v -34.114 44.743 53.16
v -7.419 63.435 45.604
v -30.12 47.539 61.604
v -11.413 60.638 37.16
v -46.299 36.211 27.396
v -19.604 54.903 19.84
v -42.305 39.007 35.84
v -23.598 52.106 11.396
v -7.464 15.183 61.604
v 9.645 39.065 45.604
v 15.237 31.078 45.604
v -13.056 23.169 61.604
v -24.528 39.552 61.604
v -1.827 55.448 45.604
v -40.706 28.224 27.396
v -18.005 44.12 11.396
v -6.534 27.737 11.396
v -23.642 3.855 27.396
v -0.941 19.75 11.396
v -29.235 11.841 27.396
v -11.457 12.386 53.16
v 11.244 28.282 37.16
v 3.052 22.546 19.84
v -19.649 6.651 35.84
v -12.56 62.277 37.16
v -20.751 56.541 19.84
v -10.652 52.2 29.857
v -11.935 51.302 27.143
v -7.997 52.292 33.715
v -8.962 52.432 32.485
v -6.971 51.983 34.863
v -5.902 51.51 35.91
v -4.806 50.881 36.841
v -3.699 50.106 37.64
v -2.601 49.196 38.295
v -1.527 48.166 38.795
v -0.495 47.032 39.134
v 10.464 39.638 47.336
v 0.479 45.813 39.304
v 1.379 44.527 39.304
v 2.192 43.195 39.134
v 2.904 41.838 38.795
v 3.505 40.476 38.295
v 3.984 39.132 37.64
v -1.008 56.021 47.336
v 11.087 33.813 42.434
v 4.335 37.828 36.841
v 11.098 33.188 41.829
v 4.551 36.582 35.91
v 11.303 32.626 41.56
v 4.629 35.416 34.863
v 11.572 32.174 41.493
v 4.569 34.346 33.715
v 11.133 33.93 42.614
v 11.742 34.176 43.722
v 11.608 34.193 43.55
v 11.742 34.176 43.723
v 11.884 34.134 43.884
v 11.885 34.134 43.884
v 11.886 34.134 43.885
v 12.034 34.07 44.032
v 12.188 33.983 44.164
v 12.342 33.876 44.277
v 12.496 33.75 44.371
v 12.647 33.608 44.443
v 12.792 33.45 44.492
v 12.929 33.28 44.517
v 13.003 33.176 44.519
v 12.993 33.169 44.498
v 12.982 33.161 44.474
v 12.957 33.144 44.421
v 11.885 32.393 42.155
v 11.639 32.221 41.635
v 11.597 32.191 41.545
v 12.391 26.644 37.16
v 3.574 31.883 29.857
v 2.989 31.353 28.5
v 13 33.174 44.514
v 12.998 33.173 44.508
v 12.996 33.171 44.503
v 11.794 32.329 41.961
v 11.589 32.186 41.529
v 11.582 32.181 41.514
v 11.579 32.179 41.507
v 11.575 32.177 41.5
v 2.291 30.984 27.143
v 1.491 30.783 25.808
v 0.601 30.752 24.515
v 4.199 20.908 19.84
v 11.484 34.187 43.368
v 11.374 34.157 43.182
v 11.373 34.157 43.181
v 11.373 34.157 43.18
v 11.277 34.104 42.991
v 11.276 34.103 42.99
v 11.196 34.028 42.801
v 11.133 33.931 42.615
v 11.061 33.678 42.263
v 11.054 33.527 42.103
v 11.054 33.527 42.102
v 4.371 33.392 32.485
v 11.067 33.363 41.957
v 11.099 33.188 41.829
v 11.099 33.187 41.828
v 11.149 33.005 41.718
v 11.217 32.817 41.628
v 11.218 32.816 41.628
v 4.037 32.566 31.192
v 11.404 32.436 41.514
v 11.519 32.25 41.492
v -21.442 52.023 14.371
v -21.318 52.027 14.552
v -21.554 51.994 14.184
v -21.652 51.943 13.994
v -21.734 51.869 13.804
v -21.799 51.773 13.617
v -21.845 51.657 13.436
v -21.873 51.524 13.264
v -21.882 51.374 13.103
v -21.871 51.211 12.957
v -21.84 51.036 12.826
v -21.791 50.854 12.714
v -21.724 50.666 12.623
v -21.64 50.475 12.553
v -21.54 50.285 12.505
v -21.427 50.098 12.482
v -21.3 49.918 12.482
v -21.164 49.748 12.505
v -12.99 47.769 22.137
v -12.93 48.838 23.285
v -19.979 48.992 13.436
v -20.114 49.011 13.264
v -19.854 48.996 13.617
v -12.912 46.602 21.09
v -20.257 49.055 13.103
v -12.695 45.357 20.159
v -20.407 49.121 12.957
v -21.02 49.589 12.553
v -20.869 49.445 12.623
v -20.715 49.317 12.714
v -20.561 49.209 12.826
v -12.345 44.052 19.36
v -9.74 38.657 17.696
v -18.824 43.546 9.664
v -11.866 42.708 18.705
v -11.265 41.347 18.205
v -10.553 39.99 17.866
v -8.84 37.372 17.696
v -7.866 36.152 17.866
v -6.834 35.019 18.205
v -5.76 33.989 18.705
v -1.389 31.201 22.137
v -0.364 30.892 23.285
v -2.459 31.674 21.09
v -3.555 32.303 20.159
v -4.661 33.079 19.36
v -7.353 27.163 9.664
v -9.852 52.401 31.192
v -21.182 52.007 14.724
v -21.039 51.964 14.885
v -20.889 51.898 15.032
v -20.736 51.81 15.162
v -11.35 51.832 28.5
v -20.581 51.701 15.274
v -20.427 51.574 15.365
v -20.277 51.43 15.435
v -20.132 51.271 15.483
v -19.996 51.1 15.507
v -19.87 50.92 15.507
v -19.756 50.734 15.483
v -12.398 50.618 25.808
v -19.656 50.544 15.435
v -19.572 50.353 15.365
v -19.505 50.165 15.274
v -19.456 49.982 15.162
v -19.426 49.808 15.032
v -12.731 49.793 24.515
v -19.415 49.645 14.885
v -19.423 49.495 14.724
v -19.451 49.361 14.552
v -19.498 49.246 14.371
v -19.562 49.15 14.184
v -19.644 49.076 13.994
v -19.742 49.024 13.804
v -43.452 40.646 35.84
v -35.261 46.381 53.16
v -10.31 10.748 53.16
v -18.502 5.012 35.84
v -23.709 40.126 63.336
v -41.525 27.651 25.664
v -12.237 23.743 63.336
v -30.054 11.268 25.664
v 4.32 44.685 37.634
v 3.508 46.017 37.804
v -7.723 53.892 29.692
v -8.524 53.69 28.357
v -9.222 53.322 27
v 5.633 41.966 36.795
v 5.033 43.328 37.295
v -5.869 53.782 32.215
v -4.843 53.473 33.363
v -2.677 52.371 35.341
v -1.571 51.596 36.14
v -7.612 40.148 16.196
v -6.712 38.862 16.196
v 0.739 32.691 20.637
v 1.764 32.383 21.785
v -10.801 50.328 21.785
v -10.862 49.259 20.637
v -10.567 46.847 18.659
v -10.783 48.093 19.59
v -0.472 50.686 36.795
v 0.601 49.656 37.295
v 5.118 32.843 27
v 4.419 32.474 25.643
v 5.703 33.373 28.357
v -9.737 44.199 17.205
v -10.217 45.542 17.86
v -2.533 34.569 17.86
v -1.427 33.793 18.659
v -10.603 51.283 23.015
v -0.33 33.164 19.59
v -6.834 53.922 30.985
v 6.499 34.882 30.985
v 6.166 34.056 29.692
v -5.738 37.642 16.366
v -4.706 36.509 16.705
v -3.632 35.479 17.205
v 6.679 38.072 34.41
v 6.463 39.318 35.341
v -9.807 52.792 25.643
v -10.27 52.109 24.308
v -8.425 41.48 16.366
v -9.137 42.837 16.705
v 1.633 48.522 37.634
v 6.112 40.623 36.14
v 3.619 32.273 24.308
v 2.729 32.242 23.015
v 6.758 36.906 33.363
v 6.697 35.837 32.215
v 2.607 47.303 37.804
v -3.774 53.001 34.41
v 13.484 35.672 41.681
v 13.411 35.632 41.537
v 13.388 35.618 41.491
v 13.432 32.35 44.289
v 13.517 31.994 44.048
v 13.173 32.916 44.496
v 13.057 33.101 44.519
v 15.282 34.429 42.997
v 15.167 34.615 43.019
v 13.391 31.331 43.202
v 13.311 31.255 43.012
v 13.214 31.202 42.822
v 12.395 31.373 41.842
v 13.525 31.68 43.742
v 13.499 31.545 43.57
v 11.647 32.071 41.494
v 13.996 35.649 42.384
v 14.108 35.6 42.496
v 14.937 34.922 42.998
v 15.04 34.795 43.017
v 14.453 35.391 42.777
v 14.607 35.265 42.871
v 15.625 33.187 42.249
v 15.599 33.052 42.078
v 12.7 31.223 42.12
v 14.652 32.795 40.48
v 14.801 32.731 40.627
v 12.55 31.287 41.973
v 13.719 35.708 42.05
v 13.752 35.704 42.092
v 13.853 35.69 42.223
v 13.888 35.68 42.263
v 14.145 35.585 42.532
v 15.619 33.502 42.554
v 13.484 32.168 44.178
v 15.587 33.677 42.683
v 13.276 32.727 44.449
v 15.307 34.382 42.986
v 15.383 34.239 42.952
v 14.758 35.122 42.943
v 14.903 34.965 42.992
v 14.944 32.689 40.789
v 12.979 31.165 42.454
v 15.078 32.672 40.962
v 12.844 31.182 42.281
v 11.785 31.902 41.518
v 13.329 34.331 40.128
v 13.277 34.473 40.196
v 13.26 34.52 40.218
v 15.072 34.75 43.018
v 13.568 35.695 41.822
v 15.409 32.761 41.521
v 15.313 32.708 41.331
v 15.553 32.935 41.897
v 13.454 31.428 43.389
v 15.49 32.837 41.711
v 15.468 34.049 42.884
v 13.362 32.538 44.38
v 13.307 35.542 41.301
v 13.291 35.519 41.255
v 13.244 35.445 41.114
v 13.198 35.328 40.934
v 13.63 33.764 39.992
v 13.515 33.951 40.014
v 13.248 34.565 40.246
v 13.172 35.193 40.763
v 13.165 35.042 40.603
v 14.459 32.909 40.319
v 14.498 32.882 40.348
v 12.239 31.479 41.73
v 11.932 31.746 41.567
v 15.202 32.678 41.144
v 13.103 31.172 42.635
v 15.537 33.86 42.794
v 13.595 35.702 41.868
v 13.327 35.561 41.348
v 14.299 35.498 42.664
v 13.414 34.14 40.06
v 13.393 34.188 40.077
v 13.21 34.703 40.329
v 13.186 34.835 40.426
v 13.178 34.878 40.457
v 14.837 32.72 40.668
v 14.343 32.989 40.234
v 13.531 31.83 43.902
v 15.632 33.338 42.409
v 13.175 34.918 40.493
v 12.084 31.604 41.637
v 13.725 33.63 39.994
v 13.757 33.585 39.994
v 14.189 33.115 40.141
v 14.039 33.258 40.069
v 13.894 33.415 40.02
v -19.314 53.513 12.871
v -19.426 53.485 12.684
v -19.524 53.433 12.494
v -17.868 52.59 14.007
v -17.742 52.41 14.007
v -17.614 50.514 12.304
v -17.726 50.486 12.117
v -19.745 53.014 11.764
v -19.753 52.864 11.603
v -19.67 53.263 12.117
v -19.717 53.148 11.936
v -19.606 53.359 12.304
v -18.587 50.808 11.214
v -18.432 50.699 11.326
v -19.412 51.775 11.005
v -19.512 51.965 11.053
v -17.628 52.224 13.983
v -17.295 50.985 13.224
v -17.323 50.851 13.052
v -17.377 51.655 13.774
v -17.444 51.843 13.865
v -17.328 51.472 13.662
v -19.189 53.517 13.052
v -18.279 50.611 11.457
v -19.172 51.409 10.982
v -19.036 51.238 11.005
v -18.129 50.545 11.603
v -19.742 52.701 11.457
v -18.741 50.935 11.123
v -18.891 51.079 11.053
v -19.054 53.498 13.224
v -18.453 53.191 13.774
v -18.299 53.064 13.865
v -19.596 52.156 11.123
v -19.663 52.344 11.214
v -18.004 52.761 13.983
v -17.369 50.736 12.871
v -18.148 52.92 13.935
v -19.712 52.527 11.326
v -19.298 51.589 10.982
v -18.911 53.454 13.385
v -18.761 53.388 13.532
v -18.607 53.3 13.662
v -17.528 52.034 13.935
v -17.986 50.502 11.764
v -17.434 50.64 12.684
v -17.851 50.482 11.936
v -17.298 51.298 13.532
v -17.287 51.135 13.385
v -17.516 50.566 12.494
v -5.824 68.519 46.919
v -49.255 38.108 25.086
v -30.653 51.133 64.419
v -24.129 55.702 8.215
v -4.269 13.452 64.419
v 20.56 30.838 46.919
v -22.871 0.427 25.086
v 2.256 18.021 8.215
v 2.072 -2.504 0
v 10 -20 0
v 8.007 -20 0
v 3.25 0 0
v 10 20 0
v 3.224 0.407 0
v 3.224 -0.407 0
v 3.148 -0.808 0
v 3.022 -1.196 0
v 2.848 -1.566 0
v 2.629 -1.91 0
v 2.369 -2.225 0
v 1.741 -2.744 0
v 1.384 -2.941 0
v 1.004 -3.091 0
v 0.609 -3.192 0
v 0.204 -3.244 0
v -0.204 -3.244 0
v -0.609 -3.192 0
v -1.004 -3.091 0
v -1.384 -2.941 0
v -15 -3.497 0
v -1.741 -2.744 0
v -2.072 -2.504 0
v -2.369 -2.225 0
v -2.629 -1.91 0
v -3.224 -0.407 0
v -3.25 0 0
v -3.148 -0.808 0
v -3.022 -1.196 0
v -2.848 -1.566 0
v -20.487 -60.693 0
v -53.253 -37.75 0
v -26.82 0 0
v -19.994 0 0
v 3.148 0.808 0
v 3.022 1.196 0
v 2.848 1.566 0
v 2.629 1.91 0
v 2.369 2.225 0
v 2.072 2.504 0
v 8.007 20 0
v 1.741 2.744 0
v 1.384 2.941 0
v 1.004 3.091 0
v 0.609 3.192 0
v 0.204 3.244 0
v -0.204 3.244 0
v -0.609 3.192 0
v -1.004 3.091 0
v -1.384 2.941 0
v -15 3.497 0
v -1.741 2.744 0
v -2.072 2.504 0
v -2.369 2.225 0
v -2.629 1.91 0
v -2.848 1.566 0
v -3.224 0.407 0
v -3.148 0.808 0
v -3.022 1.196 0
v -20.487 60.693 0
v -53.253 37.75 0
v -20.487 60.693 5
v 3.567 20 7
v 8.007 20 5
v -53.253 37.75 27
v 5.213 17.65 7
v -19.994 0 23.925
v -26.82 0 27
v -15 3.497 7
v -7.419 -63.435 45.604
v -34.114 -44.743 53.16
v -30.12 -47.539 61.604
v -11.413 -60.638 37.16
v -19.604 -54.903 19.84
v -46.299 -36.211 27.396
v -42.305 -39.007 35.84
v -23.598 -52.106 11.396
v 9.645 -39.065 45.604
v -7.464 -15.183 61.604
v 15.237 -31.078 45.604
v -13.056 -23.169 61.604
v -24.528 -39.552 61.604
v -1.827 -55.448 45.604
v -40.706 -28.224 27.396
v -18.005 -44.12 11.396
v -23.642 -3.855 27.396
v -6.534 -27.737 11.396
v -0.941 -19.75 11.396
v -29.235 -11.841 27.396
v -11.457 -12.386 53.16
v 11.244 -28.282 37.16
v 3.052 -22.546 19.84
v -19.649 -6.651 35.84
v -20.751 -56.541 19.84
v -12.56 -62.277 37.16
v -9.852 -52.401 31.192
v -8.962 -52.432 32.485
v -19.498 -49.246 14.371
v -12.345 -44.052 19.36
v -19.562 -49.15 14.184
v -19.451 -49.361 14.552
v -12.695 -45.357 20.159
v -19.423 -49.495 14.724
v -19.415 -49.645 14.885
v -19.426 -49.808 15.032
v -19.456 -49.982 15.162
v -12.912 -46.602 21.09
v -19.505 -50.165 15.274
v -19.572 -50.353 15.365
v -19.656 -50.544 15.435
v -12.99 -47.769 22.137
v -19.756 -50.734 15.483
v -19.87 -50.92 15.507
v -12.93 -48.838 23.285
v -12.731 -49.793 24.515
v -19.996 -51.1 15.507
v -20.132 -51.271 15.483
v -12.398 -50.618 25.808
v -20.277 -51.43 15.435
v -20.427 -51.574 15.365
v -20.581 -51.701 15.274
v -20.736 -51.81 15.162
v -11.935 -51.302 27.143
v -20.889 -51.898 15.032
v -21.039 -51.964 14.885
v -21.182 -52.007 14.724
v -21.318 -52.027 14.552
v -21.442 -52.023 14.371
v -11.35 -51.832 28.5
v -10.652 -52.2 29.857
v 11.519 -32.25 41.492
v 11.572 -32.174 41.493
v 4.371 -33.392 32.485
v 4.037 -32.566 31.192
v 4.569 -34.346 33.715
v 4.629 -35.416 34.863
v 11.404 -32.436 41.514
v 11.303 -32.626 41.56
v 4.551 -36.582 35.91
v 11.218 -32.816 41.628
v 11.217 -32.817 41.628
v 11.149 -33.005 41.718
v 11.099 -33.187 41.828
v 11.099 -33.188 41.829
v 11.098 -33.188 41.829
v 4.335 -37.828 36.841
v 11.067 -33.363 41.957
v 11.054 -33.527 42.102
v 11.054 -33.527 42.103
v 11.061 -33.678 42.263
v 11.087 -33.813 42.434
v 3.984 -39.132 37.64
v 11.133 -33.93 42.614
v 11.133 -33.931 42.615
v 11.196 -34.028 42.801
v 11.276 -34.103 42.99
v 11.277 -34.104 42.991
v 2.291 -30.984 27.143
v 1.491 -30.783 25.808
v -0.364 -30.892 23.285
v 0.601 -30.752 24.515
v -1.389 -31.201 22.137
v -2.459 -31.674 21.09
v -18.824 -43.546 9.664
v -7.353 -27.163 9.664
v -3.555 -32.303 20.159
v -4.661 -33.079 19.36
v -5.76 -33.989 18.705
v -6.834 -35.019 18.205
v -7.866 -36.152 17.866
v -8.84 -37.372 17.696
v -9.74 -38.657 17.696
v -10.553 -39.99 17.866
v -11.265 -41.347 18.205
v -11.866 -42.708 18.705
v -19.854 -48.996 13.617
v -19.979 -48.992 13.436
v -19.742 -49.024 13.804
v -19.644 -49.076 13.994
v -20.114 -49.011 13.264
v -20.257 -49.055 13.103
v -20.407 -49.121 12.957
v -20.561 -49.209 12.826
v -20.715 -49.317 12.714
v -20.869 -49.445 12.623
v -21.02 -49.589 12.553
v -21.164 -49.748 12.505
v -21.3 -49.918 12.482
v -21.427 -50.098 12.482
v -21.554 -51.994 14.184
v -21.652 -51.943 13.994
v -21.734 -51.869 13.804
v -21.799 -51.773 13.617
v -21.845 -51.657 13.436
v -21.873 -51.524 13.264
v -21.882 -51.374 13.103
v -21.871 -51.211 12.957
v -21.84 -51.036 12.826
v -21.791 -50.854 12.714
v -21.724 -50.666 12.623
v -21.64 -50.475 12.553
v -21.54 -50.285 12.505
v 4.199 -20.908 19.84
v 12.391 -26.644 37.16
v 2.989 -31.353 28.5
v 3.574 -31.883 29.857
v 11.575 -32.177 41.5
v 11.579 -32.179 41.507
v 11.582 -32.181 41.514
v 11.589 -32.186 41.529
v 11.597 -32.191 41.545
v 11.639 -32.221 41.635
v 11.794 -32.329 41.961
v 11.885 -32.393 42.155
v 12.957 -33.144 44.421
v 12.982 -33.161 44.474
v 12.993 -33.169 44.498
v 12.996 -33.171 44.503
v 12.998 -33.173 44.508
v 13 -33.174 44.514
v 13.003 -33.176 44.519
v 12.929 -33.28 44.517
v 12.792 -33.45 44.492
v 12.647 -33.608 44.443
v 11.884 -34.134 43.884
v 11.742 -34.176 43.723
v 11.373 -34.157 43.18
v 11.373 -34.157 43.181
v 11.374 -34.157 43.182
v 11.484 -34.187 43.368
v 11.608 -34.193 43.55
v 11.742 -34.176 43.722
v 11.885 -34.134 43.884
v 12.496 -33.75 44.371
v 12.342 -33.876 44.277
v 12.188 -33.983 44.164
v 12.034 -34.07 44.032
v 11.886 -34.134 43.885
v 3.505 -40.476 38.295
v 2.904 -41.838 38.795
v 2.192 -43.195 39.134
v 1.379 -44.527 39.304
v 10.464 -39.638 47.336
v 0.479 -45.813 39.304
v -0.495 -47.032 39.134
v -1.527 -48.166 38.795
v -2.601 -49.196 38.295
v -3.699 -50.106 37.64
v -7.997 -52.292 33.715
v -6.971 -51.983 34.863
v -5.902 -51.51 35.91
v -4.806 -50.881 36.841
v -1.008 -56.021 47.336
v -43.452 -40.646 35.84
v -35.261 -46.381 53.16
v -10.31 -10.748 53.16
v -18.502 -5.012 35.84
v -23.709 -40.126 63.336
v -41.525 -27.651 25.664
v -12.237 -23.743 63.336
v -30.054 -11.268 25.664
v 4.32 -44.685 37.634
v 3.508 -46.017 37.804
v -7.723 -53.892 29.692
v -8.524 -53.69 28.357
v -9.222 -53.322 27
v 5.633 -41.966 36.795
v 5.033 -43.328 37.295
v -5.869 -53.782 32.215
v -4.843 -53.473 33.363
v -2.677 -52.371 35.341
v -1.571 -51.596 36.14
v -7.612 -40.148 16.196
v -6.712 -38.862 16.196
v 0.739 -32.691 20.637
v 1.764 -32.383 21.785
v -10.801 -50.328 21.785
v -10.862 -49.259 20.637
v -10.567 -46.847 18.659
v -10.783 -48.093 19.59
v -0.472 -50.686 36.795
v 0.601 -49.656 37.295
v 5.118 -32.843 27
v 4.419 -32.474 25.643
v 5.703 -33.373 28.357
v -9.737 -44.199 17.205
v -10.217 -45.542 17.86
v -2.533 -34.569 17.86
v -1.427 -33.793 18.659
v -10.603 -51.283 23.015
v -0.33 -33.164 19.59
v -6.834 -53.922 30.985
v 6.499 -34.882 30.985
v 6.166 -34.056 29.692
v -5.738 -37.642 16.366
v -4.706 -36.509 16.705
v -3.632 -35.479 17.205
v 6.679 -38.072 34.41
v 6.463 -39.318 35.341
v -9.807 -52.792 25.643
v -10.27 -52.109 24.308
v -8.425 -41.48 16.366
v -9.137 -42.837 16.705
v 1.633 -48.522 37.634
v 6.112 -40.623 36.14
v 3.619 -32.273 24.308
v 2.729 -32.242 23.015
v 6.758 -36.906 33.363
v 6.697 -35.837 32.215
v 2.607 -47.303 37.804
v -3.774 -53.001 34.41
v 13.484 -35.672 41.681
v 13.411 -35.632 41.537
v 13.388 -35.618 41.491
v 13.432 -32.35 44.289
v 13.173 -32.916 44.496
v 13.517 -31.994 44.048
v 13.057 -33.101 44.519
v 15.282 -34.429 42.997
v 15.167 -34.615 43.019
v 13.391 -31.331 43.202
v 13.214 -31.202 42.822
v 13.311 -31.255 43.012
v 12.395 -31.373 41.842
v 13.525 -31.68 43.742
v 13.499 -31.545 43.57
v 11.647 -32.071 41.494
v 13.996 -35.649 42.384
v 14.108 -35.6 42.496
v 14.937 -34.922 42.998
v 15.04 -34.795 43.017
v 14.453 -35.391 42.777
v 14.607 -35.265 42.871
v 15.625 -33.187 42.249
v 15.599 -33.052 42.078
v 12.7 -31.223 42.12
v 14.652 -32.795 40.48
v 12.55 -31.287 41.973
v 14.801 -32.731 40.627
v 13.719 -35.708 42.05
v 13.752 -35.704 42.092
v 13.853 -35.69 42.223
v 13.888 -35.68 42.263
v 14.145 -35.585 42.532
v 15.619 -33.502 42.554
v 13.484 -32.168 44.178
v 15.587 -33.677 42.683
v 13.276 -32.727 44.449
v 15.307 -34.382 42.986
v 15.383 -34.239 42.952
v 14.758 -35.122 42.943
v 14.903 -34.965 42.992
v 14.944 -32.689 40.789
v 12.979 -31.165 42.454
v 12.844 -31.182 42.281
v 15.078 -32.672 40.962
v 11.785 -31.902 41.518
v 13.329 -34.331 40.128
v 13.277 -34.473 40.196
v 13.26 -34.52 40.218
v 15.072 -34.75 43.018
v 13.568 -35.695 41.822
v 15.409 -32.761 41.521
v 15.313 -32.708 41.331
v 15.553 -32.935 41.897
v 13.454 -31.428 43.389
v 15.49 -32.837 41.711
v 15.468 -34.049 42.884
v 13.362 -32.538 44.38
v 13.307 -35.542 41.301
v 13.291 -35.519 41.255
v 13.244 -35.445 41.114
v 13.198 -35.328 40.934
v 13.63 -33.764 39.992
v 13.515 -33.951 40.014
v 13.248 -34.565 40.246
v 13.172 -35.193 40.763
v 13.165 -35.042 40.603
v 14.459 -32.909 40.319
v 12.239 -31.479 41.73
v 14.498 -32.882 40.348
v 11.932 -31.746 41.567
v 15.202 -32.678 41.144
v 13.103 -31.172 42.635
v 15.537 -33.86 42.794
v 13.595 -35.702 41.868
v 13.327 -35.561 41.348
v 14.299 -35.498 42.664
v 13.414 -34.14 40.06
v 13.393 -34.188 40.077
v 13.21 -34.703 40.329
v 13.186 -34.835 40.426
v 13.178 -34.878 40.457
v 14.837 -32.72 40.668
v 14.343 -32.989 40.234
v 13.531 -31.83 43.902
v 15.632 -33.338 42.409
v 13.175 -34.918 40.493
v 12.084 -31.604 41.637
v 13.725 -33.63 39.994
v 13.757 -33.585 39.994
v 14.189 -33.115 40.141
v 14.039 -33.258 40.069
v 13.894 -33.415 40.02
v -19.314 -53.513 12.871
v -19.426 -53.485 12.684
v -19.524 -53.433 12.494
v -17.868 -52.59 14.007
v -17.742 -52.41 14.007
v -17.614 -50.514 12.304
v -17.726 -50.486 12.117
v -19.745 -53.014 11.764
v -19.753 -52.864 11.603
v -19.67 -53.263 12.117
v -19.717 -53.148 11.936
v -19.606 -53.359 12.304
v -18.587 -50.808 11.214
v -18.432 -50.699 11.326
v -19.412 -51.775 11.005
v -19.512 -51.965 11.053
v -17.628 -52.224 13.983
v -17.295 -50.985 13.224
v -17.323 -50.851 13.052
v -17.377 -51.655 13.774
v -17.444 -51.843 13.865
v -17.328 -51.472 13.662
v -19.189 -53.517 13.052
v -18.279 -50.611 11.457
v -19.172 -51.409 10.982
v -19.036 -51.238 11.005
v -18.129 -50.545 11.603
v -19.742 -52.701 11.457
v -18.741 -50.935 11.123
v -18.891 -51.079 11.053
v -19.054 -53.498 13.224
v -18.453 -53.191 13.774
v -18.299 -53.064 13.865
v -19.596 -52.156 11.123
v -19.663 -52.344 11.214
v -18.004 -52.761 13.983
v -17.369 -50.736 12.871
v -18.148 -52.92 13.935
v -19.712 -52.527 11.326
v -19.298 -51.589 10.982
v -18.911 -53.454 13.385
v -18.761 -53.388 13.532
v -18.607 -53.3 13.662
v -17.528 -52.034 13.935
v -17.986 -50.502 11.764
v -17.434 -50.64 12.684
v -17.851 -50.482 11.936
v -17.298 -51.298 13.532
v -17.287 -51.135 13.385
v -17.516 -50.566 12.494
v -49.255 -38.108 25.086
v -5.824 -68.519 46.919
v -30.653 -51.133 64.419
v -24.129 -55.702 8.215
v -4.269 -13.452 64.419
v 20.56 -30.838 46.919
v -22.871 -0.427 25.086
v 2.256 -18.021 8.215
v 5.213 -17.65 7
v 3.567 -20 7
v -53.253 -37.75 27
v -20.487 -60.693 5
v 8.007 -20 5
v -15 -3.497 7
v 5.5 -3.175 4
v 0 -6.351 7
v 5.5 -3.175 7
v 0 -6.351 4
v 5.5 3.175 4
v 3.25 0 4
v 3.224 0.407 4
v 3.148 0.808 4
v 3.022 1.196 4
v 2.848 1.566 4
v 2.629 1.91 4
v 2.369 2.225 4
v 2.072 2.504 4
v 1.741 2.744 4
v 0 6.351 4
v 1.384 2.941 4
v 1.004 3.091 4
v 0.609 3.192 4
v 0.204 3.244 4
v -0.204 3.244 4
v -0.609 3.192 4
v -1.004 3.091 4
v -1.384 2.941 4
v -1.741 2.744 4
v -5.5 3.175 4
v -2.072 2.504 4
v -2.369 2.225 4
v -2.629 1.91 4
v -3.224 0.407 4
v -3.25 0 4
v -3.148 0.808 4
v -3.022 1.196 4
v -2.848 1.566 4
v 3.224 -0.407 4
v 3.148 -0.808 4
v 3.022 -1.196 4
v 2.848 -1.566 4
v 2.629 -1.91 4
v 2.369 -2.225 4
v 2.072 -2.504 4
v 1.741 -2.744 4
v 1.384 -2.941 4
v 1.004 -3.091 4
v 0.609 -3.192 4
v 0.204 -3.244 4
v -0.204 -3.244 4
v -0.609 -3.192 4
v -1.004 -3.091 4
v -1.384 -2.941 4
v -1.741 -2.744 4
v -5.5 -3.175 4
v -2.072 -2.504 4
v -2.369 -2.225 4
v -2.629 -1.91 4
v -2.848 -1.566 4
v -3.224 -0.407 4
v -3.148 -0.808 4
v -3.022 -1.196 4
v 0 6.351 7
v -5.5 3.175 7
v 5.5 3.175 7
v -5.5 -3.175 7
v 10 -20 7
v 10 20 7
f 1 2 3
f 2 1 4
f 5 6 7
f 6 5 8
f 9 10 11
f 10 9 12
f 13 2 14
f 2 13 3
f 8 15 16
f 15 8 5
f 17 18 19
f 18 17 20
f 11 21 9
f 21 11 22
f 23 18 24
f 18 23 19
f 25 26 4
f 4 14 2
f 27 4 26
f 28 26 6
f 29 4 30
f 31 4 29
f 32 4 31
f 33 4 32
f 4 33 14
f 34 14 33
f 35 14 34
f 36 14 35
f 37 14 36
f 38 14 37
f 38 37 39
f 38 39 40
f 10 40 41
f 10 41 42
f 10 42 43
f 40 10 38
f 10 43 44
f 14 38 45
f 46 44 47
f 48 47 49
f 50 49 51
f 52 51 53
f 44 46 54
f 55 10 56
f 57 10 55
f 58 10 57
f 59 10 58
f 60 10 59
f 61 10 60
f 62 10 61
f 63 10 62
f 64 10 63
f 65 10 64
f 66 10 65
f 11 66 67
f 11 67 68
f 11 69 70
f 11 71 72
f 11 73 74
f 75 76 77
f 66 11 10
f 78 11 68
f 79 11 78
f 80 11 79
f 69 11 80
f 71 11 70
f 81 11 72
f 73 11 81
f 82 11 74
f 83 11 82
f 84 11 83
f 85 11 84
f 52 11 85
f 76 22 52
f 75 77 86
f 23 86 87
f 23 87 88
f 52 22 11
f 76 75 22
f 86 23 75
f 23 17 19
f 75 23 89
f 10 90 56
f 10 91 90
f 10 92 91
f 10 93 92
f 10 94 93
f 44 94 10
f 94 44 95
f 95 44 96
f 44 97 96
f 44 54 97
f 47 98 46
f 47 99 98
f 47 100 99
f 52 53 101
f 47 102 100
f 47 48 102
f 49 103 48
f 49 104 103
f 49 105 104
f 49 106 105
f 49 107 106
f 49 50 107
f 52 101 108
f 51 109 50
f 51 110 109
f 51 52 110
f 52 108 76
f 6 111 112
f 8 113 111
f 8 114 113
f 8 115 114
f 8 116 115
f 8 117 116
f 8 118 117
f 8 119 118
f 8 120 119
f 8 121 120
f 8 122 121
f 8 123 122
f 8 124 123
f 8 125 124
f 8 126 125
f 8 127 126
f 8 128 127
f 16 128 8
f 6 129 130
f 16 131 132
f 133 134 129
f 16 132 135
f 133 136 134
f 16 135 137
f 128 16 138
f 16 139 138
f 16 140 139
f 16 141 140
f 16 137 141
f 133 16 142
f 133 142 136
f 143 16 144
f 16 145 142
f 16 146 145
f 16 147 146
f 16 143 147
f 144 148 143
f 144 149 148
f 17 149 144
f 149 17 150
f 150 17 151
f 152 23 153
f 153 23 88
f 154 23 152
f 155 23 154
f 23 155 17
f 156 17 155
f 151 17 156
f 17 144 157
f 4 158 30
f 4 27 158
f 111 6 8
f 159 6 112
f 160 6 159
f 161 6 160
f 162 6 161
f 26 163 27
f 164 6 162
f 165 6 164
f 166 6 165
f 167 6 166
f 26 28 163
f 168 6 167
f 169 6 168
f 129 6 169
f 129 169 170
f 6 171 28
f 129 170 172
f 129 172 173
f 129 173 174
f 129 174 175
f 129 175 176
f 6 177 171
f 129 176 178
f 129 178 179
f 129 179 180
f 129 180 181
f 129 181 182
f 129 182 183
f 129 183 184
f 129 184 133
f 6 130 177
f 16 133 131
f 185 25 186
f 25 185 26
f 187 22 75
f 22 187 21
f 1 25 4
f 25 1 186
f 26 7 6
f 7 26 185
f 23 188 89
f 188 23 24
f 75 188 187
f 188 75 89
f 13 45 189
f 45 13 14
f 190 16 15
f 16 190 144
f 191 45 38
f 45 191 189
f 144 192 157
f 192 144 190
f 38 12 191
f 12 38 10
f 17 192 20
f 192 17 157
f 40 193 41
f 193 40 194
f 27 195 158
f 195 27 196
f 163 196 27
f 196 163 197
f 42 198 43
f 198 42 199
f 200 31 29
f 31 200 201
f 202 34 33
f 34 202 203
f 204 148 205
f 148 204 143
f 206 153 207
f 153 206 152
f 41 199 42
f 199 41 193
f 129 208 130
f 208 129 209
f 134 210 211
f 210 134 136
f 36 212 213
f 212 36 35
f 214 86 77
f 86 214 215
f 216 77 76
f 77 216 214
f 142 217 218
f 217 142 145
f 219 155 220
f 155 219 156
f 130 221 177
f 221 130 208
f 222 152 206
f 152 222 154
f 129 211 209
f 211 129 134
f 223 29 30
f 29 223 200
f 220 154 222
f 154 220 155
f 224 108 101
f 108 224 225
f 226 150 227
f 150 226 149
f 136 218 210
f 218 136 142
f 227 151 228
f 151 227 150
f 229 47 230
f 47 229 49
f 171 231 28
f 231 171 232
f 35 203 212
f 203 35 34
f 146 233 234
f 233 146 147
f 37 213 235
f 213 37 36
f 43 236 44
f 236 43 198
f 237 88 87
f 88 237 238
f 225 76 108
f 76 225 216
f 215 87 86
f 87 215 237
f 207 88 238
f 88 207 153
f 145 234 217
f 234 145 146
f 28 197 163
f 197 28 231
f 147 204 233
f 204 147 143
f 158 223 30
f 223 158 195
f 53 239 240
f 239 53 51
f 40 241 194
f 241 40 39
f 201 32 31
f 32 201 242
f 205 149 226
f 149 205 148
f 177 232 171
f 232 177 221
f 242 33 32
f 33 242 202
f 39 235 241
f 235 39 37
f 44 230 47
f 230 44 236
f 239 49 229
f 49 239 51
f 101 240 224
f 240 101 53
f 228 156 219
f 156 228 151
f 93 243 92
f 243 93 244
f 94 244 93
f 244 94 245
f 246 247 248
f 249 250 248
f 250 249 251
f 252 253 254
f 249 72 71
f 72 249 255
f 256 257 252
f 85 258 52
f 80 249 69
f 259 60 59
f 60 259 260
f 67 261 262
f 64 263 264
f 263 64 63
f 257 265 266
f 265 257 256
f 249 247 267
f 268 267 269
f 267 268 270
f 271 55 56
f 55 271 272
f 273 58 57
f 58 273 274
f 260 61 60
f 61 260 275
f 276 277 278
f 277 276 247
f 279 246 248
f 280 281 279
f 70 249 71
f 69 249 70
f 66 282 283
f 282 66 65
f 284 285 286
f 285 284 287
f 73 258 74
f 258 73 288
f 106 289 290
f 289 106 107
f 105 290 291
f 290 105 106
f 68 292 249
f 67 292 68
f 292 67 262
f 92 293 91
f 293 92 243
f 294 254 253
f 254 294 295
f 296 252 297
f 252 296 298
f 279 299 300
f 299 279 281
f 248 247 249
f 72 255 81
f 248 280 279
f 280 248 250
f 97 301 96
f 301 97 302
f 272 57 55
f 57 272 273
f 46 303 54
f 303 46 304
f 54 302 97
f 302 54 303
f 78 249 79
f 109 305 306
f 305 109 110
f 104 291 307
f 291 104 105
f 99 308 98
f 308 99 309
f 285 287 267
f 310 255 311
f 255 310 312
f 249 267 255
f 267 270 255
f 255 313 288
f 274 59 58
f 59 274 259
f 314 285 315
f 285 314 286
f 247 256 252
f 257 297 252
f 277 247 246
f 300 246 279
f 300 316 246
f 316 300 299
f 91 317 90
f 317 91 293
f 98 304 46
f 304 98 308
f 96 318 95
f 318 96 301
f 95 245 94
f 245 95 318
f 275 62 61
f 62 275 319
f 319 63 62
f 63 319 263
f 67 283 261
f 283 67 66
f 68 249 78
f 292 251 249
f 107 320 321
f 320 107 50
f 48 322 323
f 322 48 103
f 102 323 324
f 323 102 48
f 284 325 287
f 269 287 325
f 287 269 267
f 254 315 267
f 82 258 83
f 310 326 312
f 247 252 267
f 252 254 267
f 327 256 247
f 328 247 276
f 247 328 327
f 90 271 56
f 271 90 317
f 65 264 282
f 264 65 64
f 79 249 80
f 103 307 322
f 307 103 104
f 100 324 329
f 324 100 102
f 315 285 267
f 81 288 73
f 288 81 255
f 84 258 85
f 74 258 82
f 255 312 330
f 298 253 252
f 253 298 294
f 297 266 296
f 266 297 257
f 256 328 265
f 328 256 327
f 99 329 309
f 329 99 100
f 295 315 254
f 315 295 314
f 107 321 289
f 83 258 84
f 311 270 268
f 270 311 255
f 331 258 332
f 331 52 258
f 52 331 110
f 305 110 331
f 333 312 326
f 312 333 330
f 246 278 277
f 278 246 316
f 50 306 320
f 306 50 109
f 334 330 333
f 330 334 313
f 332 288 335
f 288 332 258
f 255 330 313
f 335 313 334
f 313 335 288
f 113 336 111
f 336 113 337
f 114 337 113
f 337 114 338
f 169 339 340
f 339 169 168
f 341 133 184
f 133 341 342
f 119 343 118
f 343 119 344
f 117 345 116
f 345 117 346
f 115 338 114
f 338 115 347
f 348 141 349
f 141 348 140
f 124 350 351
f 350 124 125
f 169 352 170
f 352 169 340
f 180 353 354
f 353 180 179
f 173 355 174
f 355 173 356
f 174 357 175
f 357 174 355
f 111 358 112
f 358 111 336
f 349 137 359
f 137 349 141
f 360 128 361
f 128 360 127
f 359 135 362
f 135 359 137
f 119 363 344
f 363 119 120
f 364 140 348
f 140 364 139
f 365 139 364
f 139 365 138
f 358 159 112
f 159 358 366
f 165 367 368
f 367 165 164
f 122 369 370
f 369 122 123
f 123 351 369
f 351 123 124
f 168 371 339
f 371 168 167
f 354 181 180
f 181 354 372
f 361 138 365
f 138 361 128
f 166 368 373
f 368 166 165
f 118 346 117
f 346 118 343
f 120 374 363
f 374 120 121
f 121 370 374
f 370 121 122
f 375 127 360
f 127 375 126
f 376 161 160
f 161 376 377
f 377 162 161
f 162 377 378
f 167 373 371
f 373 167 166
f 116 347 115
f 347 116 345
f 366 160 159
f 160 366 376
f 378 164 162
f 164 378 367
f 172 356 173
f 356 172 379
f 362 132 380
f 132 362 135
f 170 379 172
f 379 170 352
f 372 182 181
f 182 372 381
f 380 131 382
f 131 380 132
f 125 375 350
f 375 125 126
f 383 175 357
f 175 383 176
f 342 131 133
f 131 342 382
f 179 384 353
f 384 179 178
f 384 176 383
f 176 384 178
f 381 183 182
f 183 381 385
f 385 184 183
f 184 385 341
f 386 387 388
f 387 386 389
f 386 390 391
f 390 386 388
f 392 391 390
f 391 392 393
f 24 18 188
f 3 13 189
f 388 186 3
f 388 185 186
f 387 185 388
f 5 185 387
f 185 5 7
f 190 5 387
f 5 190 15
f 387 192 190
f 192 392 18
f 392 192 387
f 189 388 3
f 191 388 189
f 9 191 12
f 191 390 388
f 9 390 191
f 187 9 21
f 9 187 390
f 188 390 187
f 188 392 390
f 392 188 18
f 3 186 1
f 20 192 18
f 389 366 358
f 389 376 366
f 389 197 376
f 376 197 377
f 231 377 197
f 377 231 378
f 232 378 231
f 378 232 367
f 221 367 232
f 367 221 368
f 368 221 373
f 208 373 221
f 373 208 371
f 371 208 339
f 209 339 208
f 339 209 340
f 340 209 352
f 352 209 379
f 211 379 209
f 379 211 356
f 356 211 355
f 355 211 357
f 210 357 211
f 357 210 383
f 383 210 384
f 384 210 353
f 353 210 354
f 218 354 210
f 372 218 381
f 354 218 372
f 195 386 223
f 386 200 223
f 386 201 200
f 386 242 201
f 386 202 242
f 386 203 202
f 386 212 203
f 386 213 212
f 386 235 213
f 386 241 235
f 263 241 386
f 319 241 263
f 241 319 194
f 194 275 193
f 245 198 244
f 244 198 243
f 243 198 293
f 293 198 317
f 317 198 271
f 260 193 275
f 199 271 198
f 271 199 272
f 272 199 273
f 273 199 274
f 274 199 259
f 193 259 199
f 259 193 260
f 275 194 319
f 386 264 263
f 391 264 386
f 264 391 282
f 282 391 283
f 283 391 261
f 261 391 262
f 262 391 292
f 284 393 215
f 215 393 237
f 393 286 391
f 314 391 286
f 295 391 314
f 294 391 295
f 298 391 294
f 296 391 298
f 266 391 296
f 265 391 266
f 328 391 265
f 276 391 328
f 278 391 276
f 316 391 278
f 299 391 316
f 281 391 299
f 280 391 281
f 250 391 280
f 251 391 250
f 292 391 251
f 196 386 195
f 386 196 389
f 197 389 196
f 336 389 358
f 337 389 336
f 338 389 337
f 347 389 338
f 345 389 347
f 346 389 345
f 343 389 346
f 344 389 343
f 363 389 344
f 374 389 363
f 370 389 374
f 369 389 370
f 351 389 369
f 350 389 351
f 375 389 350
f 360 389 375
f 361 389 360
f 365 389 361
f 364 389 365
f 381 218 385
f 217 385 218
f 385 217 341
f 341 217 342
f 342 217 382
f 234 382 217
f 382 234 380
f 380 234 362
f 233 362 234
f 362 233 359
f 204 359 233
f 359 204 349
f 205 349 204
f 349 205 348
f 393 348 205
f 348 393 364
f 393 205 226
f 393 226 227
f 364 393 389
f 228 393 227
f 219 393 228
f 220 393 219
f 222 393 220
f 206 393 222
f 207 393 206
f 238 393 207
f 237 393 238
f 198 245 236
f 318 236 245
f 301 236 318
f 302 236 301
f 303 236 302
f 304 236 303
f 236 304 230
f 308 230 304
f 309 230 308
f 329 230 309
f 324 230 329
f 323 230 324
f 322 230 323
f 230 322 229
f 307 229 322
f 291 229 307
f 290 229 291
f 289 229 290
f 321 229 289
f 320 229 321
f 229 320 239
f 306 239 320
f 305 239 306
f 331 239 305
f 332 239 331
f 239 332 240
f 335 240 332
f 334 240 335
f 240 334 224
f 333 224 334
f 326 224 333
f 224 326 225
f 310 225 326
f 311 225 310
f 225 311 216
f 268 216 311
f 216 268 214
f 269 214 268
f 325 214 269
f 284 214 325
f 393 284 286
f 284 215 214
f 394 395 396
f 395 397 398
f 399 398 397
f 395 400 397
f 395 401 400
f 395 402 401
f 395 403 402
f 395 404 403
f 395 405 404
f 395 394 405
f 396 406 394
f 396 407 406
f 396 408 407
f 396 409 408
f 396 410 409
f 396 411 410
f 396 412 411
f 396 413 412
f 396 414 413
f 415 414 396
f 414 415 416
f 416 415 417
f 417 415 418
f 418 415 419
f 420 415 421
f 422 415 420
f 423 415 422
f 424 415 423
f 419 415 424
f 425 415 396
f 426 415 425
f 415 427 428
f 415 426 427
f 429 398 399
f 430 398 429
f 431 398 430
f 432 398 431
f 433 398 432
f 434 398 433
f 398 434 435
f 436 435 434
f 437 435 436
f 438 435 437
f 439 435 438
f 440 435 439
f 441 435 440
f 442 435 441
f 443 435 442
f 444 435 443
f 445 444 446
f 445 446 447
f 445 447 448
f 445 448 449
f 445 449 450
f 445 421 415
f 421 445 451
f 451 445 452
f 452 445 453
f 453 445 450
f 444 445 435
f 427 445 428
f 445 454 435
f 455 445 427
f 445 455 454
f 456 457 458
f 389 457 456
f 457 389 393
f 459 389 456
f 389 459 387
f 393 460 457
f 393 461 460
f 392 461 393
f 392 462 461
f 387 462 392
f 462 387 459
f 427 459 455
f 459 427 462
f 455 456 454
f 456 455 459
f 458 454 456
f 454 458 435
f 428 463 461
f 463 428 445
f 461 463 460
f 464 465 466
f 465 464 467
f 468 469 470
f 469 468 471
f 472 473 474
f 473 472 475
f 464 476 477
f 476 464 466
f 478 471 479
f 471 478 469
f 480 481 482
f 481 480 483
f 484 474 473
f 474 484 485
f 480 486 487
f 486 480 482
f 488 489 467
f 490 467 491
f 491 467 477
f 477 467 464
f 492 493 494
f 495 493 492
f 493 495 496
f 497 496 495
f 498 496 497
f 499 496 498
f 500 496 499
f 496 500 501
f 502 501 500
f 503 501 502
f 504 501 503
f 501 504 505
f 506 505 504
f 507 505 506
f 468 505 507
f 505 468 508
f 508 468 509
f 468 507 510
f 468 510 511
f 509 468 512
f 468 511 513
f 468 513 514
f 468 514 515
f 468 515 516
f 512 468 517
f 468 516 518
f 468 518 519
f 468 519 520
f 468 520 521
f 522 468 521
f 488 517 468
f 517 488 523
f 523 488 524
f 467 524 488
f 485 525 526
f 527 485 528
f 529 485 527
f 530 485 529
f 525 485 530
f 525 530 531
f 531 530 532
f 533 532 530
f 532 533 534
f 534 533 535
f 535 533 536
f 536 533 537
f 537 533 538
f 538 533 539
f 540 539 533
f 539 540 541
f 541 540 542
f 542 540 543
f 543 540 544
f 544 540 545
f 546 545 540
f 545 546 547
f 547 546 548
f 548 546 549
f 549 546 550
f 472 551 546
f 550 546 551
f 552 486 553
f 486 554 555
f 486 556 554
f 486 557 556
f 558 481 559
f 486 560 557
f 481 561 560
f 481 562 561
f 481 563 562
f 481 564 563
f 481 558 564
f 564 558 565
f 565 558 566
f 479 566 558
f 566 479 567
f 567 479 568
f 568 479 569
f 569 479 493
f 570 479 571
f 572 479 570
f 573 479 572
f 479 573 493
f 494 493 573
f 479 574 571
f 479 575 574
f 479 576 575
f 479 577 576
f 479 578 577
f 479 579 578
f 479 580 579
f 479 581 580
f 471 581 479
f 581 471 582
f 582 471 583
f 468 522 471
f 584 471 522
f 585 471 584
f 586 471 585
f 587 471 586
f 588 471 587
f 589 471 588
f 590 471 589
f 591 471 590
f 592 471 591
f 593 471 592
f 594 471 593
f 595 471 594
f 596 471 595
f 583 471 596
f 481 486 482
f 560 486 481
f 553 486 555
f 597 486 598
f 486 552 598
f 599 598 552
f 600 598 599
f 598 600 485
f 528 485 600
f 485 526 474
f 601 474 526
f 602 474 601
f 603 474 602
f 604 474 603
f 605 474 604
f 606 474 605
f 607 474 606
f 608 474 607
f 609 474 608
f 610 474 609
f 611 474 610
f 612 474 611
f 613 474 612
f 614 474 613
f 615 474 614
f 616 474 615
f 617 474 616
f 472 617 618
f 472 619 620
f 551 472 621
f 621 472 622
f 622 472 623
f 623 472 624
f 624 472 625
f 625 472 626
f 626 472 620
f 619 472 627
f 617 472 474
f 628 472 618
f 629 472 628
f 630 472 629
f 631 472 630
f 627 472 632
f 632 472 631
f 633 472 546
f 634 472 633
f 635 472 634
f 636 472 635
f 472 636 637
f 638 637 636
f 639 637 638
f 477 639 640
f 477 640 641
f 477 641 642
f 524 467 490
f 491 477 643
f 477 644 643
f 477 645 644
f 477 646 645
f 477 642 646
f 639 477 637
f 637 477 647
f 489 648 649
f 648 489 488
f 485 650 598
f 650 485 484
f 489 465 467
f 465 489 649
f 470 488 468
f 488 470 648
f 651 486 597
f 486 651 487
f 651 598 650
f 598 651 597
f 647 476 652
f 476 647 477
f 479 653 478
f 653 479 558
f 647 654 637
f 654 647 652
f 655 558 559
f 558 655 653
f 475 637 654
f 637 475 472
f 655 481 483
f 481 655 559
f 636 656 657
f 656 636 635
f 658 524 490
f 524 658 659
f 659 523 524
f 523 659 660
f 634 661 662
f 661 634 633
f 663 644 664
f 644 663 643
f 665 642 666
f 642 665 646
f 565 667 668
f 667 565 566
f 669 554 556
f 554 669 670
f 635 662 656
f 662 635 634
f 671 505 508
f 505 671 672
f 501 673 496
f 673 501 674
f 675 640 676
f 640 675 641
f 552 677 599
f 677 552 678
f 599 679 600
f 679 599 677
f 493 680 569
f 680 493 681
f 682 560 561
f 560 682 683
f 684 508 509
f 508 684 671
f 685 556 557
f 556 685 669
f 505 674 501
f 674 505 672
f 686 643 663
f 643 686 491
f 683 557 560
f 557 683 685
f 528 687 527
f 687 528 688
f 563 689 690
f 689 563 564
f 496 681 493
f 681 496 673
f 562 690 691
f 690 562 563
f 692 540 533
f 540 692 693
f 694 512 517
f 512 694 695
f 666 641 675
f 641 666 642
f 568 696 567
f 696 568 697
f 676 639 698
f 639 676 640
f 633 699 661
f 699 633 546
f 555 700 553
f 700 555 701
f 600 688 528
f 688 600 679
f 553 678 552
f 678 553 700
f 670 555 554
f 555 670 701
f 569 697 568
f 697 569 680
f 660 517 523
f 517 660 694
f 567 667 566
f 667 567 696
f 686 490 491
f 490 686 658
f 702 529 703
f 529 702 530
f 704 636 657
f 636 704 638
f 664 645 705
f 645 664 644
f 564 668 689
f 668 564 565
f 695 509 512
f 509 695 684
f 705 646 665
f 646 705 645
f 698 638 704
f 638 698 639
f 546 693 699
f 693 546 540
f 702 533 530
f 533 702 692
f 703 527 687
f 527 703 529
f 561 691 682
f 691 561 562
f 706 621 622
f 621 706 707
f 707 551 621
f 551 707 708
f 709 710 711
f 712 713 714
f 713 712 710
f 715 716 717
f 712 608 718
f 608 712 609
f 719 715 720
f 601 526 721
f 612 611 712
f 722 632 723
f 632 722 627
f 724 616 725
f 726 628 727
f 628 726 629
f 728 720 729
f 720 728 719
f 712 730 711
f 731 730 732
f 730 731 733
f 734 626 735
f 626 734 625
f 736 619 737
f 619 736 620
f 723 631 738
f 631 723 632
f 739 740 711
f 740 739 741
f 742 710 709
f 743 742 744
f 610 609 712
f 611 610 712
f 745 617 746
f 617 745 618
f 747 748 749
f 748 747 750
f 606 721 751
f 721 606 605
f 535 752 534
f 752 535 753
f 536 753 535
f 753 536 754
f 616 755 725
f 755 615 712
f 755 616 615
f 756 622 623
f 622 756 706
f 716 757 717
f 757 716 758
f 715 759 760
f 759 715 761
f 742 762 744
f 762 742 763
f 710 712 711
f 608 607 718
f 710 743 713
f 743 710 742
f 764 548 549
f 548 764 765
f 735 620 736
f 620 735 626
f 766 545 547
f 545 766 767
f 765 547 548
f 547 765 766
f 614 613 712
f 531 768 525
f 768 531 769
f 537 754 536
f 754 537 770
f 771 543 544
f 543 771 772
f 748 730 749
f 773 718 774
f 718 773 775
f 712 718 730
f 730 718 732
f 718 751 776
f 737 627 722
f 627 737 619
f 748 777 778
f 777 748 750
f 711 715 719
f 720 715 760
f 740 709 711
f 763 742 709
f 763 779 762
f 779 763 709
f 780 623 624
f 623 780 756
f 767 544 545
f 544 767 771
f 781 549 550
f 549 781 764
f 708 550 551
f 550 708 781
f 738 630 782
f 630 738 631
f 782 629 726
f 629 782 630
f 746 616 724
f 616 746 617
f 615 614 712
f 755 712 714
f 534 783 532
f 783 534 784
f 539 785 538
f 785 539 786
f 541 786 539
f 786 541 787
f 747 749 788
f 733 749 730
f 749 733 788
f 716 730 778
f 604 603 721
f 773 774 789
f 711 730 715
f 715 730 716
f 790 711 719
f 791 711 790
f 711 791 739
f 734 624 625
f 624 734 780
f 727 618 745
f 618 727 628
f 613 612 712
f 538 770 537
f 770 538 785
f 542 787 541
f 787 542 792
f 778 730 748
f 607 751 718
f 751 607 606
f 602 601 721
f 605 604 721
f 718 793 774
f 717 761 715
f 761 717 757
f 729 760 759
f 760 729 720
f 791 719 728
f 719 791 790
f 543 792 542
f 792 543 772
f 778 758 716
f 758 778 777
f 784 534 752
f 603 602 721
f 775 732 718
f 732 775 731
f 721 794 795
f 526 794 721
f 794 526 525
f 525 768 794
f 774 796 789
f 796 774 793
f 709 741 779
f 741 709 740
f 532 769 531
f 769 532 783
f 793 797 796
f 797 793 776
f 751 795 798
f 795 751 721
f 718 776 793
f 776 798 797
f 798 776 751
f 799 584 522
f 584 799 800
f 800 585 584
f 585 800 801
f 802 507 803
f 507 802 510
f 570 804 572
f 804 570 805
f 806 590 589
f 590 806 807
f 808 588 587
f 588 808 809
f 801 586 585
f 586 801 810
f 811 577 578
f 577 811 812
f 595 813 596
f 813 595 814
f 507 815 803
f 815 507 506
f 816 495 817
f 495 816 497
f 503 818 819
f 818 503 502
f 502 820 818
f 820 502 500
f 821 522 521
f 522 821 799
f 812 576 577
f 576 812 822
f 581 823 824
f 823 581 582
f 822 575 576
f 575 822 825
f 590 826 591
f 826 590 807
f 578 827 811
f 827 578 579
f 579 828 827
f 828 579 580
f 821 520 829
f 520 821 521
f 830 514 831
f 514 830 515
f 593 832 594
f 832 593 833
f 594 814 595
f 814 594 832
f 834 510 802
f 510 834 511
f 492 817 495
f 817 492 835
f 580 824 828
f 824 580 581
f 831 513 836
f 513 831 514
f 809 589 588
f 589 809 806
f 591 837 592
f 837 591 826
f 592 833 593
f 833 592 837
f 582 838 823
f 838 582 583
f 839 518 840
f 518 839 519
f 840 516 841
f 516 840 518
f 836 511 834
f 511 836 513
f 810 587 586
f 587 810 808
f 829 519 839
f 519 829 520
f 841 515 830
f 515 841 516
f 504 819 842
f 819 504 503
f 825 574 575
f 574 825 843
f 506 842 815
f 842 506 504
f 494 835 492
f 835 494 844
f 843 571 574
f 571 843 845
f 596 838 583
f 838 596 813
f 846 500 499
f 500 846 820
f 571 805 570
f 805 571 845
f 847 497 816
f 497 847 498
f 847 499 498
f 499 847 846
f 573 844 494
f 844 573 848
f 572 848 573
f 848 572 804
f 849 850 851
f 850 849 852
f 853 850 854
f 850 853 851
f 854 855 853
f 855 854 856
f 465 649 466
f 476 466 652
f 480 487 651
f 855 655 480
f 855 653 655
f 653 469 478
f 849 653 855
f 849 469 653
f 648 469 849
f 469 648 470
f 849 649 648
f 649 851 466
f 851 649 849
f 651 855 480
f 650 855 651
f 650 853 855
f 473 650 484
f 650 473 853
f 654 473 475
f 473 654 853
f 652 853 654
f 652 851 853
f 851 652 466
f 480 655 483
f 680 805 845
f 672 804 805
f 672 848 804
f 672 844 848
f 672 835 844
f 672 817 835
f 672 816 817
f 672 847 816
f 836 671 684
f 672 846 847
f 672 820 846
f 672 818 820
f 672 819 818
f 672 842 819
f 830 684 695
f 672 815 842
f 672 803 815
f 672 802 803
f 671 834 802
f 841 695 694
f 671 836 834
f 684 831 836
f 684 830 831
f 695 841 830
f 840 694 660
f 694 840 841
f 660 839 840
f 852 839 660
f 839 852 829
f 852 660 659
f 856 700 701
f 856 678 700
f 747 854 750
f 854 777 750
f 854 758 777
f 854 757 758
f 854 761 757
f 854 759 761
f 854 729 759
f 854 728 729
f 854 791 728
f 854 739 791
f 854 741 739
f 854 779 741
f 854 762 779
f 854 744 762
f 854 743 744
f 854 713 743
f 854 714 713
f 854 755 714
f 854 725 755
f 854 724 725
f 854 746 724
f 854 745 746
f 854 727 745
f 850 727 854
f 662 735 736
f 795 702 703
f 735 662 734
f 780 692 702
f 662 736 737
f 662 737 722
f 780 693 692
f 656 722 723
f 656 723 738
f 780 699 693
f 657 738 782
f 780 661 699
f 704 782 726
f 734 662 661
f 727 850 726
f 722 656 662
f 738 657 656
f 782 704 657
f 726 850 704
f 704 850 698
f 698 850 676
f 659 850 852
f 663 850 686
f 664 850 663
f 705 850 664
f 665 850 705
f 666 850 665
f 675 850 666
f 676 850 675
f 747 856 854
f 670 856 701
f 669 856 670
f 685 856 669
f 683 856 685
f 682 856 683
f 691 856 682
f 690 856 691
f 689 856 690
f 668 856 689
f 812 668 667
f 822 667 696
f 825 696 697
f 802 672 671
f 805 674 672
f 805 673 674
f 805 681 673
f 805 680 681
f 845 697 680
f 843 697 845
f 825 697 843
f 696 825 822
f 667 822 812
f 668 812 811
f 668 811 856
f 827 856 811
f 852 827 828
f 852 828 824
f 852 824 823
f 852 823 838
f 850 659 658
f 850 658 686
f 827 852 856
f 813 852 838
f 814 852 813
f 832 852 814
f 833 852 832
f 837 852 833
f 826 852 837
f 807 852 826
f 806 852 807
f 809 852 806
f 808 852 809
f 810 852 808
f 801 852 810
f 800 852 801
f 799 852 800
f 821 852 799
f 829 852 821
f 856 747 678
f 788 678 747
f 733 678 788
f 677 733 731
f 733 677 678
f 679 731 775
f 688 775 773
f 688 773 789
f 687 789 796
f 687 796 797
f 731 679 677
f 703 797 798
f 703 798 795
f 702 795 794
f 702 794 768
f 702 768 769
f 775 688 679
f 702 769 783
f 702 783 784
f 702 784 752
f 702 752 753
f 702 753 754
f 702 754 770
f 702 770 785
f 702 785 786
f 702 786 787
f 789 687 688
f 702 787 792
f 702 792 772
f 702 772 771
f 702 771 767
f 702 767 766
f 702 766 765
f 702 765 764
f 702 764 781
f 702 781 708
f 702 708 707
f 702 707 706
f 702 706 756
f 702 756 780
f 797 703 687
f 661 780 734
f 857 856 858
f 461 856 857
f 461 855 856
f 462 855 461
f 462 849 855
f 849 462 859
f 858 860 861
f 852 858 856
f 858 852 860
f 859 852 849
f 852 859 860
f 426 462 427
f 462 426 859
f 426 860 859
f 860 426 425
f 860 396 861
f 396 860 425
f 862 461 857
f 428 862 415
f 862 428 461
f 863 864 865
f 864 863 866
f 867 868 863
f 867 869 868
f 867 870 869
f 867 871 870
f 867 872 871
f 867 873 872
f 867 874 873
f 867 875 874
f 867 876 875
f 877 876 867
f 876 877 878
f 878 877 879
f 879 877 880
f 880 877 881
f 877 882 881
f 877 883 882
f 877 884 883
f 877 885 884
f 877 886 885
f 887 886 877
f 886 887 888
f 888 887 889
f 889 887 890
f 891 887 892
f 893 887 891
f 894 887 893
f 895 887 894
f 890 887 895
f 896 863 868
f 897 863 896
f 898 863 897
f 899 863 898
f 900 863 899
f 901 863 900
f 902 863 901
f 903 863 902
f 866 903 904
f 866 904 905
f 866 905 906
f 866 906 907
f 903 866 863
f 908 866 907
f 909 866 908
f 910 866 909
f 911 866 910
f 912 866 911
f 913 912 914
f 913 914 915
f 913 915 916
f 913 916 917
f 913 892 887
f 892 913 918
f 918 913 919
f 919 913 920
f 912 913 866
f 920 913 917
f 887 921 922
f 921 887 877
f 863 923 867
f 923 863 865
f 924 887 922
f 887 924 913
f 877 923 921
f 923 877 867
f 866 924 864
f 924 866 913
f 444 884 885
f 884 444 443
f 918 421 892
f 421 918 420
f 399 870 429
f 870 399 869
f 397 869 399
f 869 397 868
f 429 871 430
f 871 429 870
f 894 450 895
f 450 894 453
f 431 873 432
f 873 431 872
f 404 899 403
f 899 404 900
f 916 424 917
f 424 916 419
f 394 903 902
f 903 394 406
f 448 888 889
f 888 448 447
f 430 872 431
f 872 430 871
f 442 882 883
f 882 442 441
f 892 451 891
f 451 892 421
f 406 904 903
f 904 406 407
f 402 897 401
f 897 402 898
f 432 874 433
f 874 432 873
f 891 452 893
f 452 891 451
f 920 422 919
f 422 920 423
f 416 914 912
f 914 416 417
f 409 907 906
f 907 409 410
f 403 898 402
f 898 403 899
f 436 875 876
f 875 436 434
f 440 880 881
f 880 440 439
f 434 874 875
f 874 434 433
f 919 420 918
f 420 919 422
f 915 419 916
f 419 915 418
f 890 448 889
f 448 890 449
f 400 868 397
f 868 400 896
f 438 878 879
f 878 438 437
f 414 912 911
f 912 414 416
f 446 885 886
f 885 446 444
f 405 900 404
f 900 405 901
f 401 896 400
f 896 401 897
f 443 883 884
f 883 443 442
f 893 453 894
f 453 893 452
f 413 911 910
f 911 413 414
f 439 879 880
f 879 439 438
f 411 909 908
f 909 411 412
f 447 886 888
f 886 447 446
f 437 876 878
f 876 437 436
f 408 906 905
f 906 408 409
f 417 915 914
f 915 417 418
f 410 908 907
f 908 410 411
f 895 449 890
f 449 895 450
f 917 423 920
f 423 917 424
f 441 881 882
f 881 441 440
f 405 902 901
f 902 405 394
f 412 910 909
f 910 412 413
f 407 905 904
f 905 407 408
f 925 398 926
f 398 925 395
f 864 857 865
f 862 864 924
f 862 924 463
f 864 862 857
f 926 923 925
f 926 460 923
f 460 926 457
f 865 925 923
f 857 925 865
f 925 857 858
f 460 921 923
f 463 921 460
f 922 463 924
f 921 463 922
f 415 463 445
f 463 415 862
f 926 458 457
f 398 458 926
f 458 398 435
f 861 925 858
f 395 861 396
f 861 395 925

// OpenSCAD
resolution_factor = 1.00;

module quarter_inch_nut_cutout()
{
    union()
    {
        translate([0, 0, -20])
            cylinder(r = 6.5/2, h = 21, $fn = 50*resolution_factor);
        
        for (i = [-60,0,60])
        {
            translate([0, 0, 5.65/2])
            rotate(i, [0, 0, 1])
                cube([11, tan(30)*11, 5.65], center = true);
        }
    }
}

module mountHold(l, w, h)
{
    cube([l, w, h]);        
}    


module poly_square(by, bx, ty, tx)
{
    polyhedron(
       points=[
                //Buttom Points
              [ 0, 0, 0 ],  //0
              [ 0, by, 0 ],  //1
              [ bx, by, 0 ],  //2
              [ bx, 0, 0 ],  //3
                //Top Points1
              [ 0, 0, ty ],  //4
              [ 0, by, ty ],  //5
              [ bx, by, tx ],  //6
              [ bx, 0, tx ]], //7
        faces=[
              [0,1,2,3],  // bottom
              [7,6,5,4],  // top
              [4,5,1,0],  // x0
              [5,6,2,1],  // parax
              [6,7,3,2],  // paray
              [7,4,0,3]] // y0
    );    
}


module prism(l, w, h)
{
    polyhedron(
               points=[[0,0,0], [l,0,0], [l,w,0], [0,w,0], [0,w,h], [l,w,h]],
               faces=[[0,1,2,3],[5,4,3,2],[0,4,5,1],[0,3,4],[5,2,1]]
               );    
}

module camera_cutout()
{
    width = 39.5;
    height = 39.5;
    length = 68;
    cable_well_depth = 4.0;
    cable_well_width= 20.0;
    
    //How much do we pull back 
    translate([0, 3, 0])
    
    union()
    {
        //Basic block of electronics
        translate([0, length/2, 0])
        cube([width, length, height], center = true);
        
        //Channel for cables between electronics
        translate([0, length/2.0, 0])
        cube([width+cable_well_depth, length, cable_well_width], center = true);
        translate([0, length/2.0, 0])
        cube([cable_well_width, length, height+cable_well_depth], center = true);
        
        //Lens hole
        translate([0, 0.01, 0])
        rotate(90, [1, 0, 0])
        cylinder(r = 12.5, h = 20, $fn = 50);
        
        //Screwholes
        zz = 33.5/2;
//        translate([zz, 0.01, zz])
//        rotate(90, [1, 0, 0])
//        cylinder(r = 3.5/2, h = 4, $fn = 50);
        translate([-zz, 0, zz])
        rotate(90, [1, 0.01, 0])
        cylinder(r = 3.5/2, h = 4, $fn = 50);
        translate([zz, 0.01, -zz])
        rotate(90, [1, 0, 0])
        cylinder(r = 3.5/2, h = 4, $fn = 50);
//       translate([-zz, 0.01, -zz])
//       rotate(90, [1, 0, 0])
//       cylinder(r = 3.5/2, h = 4, $fn = 50);
        
    }
}

module camera()
{
    width = 46;
    depth = 35.0;
    difference()
    {
        union()
        {
            translate([0, depth/2, 0])
            cube([width, depth, width], center = true);
        }
        camera_cutout();
    }
}

/*POLYHEDRA BOX DIMENSIONS*/
aby = 50;
abx = 40;
aty = 27;
atx = 5;

/*CAMERA BOXES DIMENSIONS*/
dispH = 35;
dispV = 30;
distV = 44;

module boxANDpoly(){

    union(){
        color( "PaleGreen", 1.0 ) {
            translate([-30, 0, 0])
            poly_square(aby, abx, aty, atx);
                    }   
        color( "MediumPurple", 1.0 ) {
            translate([15, 25, 27])
            rotate([30, 0, 90])
            camera();
        }
     }
}

module unit(){
    difference(){    
        translate([0, 14, 0])
        rotate([0, 0, 35])
        boxANDpoly();
        translate([-50, -70, -10])
        cube([70, 70, 70]);
    }
}


unit();
mirror([0, 1, 0]) unit();

     //SCREWBOLD CUTOUT
     difference(){
        translate([-15, -20, 0])
        mountHold(25, 40, 7);
        translate([0, 0, 4])
        quarter_inch_nut_cutout(); 
         }

//quarter_inch_nut_cutout(); 
